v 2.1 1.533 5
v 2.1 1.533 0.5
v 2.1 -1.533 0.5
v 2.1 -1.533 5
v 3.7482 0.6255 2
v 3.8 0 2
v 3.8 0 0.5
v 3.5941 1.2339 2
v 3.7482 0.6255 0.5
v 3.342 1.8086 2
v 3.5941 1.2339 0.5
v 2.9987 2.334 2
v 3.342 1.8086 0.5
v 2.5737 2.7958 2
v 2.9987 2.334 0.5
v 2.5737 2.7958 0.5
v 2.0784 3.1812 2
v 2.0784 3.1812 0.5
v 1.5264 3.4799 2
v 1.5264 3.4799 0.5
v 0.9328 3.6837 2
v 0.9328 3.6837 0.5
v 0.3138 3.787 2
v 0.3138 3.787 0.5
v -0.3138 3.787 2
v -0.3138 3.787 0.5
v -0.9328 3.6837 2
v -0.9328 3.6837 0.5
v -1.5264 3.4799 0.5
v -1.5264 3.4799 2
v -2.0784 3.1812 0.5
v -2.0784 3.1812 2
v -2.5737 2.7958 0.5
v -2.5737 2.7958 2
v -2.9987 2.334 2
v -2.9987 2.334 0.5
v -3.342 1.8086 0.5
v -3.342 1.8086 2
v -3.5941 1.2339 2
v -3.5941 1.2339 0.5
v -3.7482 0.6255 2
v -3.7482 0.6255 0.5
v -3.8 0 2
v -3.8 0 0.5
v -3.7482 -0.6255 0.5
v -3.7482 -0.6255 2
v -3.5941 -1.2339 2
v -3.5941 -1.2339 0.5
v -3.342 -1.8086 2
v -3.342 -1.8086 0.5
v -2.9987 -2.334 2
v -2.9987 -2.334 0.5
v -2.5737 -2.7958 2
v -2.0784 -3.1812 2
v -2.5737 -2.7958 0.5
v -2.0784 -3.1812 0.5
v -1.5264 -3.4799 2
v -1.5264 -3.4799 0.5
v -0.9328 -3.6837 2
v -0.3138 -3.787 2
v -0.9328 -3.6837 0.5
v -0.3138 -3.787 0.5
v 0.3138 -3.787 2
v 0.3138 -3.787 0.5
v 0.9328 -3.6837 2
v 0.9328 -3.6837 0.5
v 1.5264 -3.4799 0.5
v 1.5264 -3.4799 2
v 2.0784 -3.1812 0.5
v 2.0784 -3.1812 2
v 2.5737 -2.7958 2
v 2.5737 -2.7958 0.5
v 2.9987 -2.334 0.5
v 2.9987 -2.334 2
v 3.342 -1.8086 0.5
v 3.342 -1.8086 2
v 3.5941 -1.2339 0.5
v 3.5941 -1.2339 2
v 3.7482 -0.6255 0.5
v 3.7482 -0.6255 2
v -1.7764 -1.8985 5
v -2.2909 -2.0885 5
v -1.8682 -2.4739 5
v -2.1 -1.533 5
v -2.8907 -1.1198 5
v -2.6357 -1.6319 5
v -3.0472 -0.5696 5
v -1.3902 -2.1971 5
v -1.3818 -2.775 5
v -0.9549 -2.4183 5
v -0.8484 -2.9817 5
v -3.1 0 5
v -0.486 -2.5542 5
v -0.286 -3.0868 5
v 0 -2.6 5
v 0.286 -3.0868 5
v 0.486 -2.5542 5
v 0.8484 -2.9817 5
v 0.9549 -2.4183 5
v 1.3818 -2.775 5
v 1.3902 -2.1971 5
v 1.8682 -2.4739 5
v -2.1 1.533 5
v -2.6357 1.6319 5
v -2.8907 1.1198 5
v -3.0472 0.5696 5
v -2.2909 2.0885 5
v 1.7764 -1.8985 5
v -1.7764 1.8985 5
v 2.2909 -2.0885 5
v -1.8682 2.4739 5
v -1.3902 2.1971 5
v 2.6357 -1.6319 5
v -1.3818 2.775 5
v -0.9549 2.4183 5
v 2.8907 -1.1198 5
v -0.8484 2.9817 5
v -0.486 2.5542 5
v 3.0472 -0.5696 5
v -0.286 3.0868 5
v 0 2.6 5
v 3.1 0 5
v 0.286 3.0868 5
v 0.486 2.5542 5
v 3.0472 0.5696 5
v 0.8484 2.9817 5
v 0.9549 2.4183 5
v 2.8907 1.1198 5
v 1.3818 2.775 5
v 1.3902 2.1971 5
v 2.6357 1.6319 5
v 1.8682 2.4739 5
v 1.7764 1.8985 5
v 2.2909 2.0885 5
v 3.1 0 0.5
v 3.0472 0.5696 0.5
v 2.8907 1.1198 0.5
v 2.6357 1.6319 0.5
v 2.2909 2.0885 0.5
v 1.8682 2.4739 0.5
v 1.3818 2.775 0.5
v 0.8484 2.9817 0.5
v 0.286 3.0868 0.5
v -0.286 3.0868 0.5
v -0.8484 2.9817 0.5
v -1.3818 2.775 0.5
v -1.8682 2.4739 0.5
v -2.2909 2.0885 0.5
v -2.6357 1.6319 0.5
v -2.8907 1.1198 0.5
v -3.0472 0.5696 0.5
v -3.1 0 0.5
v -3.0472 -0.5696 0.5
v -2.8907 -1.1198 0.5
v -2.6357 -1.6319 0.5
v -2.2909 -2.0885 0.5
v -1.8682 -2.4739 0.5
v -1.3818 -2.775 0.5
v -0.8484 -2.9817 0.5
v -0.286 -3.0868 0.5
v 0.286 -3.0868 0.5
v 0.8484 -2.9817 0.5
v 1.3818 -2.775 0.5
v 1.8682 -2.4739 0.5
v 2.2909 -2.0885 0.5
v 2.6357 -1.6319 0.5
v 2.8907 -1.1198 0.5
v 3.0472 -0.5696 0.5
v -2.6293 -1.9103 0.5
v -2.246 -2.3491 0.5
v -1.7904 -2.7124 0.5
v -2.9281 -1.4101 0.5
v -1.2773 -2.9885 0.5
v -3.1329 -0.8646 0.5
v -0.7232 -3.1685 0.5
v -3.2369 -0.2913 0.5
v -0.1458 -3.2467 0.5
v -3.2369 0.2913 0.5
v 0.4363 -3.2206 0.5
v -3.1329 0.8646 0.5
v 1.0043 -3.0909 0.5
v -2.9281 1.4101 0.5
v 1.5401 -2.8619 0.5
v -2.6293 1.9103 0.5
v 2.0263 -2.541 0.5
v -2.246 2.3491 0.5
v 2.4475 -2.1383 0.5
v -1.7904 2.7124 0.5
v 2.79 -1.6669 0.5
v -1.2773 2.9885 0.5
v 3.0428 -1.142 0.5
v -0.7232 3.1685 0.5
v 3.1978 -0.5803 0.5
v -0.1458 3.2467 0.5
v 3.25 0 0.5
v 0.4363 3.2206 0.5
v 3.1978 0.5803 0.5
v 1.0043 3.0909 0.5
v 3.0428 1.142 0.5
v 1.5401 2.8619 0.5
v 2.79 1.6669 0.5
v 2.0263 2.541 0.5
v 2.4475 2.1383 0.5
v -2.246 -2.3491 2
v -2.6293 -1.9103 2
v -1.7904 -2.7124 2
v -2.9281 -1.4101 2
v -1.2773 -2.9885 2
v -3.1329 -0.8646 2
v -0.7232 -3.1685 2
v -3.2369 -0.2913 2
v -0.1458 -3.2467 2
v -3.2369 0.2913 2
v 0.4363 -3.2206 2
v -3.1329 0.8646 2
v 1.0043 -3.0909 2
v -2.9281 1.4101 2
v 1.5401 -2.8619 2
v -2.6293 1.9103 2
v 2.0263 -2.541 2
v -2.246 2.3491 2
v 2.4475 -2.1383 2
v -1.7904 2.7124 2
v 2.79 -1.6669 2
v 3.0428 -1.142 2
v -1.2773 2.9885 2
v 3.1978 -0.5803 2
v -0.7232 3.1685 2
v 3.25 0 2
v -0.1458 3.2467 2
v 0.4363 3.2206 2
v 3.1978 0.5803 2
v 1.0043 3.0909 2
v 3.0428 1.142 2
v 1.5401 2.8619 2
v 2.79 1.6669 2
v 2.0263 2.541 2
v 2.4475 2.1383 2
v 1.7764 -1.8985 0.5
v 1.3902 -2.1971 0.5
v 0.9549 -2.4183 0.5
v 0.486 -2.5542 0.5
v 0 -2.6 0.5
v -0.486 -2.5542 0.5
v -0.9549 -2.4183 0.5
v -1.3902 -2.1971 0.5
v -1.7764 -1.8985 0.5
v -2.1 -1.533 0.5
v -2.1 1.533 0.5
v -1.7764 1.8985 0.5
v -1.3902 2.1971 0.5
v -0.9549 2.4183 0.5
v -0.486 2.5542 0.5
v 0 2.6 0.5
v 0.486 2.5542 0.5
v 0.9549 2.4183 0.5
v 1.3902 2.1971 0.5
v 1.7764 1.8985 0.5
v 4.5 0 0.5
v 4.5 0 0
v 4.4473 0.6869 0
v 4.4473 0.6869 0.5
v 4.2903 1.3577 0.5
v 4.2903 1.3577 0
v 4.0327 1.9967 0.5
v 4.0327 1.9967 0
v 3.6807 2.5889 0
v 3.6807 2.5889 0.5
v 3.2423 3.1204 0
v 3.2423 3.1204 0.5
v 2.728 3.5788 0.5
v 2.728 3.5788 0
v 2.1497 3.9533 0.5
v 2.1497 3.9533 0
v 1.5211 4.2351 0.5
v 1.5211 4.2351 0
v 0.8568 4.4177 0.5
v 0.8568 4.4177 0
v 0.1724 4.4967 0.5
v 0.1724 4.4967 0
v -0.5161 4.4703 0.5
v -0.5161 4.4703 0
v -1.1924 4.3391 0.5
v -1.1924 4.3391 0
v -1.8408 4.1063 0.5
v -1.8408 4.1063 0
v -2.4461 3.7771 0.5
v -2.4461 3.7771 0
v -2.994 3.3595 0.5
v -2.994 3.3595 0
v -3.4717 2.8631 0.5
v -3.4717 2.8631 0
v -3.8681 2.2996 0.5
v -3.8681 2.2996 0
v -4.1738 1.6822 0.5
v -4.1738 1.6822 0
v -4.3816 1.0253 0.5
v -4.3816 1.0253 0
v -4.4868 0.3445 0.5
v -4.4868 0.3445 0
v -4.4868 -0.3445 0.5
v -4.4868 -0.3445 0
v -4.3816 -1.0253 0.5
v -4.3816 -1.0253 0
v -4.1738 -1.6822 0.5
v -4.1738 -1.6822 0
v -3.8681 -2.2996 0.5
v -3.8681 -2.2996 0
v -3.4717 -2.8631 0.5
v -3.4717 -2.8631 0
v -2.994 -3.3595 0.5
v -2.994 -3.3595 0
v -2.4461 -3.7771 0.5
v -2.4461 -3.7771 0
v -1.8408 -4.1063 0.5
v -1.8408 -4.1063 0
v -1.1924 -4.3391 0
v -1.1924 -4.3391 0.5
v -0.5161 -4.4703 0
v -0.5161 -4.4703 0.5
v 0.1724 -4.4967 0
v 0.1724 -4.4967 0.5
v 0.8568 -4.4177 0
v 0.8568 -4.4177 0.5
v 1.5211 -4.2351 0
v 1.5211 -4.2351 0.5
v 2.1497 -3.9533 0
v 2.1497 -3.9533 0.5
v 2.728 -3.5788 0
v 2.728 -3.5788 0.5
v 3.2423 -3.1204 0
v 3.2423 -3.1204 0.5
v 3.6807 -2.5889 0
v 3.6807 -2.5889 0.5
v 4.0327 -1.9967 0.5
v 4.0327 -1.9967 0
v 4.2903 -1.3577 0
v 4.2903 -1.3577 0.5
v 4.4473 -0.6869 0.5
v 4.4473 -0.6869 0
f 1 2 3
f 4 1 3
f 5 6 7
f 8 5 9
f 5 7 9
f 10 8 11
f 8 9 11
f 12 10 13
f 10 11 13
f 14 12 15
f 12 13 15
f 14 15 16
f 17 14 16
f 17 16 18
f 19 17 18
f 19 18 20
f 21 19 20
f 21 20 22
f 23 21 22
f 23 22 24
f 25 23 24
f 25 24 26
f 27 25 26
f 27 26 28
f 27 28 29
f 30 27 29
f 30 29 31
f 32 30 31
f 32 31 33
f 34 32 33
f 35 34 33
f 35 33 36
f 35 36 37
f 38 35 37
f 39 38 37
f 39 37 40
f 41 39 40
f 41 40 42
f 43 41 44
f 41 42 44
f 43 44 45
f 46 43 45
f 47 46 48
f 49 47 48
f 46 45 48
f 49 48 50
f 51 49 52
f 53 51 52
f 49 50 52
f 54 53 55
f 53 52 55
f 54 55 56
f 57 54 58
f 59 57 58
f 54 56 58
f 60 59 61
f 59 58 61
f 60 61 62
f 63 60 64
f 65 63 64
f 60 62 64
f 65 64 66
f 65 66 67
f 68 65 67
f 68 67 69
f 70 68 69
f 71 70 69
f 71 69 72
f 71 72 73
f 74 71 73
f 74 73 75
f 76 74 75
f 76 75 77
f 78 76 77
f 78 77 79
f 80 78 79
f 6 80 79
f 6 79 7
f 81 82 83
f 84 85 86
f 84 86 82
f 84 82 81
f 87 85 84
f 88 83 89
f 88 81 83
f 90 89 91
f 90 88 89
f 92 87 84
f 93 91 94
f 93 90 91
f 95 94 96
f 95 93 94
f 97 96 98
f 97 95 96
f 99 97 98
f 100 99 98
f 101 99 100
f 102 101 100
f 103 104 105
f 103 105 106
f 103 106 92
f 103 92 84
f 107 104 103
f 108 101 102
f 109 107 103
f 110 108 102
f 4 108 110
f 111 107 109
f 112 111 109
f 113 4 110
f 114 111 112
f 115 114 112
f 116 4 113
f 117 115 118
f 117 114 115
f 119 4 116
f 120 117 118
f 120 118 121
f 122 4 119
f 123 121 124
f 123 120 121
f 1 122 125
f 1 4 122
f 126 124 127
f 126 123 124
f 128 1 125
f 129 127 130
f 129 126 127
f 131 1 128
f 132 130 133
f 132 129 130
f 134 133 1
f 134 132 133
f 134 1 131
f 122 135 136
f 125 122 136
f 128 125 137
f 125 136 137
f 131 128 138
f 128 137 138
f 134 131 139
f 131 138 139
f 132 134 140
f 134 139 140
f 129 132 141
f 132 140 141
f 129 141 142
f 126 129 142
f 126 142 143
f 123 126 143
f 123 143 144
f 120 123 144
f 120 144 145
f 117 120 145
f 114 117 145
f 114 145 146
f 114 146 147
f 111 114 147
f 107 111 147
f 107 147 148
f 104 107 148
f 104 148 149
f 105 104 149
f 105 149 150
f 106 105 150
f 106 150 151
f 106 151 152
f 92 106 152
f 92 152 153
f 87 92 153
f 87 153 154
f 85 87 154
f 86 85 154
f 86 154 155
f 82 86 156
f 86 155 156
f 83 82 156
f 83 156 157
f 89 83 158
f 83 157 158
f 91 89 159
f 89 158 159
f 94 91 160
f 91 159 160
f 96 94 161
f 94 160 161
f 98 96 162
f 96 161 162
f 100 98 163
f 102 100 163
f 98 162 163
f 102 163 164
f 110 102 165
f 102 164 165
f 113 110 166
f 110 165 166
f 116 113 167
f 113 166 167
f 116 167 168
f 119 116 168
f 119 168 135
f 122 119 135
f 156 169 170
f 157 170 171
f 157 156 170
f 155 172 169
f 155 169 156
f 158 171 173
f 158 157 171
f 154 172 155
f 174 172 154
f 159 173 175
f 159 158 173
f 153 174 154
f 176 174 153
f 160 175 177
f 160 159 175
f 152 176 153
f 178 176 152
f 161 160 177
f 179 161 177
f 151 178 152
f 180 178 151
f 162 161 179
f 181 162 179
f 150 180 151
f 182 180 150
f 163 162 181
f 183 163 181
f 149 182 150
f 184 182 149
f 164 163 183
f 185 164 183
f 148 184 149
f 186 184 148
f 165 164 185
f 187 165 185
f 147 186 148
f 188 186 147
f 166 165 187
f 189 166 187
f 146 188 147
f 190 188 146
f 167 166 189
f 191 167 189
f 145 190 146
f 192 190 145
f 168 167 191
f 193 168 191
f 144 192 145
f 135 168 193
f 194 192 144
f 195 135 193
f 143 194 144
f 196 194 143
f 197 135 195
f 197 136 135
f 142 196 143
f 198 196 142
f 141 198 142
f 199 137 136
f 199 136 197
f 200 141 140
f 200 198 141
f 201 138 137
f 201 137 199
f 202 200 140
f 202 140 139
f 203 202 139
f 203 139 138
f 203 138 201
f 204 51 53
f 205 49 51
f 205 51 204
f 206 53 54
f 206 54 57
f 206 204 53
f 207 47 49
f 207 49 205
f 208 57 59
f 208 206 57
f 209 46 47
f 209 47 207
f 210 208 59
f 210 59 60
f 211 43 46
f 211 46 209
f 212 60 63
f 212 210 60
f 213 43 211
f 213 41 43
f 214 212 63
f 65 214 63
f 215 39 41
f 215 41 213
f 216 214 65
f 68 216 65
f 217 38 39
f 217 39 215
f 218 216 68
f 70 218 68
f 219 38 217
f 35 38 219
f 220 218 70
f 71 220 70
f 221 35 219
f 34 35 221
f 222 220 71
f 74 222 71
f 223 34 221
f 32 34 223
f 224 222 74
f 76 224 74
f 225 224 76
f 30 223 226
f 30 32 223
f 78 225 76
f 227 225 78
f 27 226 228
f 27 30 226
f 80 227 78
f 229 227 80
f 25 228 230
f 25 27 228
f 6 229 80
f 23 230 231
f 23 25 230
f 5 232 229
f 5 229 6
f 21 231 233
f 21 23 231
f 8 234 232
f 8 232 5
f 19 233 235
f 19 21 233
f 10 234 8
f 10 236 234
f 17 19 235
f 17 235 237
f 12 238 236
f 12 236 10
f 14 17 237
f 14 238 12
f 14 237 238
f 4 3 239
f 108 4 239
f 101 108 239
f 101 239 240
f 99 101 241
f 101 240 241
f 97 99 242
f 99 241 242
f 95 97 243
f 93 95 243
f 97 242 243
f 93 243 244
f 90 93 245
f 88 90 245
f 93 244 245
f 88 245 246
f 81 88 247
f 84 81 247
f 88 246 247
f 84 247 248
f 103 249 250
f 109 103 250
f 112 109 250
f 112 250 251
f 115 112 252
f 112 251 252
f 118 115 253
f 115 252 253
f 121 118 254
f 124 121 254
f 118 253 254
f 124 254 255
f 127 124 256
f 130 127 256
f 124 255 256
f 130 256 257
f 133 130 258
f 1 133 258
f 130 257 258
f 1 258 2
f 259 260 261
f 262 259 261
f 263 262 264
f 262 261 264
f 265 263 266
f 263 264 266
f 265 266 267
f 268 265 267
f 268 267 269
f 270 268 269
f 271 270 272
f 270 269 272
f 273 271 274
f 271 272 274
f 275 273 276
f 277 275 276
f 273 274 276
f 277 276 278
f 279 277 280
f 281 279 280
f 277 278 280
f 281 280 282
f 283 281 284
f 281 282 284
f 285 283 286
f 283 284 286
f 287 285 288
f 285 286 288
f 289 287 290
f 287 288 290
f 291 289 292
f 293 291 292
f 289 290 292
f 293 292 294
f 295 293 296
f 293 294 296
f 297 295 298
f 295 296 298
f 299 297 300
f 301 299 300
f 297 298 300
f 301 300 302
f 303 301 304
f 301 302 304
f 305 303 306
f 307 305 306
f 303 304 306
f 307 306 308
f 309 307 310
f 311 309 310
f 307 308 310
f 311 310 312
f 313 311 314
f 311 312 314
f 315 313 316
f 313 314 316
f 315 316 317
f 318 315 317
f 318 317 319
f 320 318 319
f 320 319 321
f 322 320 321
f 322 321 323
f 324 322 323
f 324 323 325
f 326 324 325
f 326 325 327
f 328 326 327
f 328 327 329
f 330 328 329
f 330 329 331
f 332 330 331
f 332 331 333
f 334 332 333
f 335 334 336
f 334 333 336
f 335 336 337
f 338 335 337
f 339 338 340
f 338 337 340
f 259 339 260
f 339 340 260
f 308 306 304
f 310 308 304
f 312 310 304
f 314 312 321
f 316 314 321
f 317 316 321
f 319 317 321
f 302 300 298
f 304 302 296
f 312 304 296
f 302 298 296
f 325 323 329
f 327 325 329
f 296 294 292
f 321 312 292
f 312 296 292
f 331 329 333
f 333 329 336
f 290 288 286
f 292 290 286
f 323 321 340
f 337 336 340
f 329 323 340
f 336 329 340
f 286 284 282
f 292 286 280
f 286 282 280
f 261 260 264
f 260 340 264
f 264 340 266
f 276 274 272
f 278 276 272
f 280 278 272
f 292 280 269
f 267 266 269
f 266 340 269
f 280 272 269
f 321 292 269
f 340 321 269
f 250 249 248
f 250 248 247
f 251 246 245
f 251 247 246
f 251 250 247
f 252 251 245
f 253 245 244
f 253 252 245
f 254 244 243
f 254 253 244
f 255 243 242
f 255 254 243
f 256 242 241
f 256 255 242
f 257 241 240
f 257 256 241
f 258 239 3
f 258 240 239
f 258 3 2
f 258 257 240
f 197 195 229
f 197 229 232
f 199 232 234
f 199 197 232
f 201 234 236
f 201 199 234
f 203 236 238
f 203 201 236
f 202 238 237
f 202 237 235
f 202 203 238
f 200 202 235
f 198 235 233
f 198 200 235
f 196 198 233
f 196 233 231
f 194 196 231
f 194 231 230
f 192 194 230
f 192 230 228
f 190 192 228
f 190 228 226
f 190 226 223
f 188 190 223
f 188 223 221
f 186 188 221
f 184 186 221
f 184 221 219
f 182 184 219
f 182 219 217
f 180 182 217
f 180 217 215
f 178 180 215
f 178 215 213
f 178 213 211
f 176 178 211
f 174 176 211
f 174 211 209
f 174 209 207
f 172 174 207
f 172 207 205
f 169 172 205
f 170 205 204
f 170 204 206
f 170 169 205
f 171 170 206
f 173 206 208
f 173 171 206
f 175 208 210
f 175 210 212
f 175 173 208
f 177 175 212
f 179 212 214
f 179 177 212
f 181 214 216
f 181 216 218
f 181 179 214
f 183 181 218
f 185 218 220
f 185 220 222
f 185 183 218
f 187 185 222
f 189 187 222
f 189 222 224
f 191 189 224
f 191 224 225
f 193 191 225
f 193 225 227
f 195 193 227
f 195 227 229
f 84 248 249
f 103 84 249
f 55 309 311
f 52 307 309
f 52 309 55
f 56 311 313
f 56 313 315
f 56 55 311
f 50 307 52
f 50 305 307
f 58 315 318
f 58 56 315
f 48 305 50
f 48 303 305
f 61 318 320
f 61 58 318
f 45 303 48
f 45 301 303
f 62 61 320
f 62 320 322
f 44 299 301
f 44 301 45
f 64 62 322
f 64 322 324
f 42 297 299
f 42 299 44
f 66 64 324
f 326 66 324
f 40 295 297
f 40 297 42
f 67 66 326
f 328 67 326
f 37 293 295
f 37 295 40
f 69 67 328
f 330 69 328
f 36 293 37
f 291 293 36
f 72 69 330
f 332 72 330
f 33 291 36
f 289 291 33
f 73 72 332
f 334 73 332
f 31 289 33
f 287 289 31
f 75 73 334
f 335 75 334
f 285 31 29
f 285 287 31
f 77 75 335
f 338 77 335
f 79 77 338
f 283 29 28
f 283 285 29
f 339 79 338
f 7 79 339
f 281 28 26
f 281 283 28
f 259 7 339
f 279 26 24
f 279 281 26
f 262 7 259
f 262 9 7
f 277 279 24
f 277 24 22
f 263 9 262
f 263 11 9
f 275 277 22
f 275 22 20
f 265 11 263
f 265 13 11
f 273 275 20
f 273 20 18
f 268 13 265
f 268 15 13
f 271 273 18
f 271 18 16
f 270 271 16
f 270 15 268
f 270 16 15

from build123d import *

# Parameters (mm, degrees)
F0_R     = 4.5
F0_R_2   = 3.8
F0_R_3   = 3.25
F1_DEPTH = 0.5
F2_DEPTH = 2
F3_R     = 3.1
F4_DEPTH = 5
F5_DEPTH = 0.5


with BuildPart() as f1:
    # F0 (on Top) → F1 (new body)
    with BuildSketch(Plane.XY):
        Circle(F0_R)
        Circle(F0_R_2, mode=Mode.SUBTRACT)
        Circle(F0_R_2)
        Circle(F0_R_3, mode=Mode.SUBTRACT)
    extrude(amount=F1_DEPTH)

    # F0 (on Top) → F2 (join)
    with BuildSketch(Plane.XY):
        Circle(F0_R_2)
        Circle(F0_R_3, mode=Mode.SUBTRACT)
    extrude(amount=F2_DEPTH)



with BuildPart() as f4:
    # F3 (on face) → F4 (new body)
    with BuildSketch(Plane.XY):
        Circle(F3_R)
        with BuildLine():
            ThreePointArc((2.1, 1.5329709717), (2.4718414189, 0.8062257748), (2.6, 0))
            ThreePointArc((2.6, 0), (2.4718414189, -0.8062257748), (2.1, -1.5329709717))
            ThreePointArc((2.1, -1.5329709717), (0, -2.6), (-2.1, -1.5329709717))
            ThreePointArc((-2.1, -1.5329709717), (-2.6, 0), (-2.1, 1.5329709717))
            ThreePointArc((-2.1, 1.5329709717), (0, 2.6), (2.1, 1.5329709717))
        make_face(mode=Mode.SUBTRACT)
        with BuildLine():
            ThreePointArc((2.1, -1.5329709717), (2.4718414189, -0.8062257748), (2.6, 0))
            ThreePointArc((2.6, 0), (2.4718414189, 0.8062257748), (2.1, 1.5329709717))
            Line((2.1, 1.5329709717), (2.1, -1.5329709717))
        make_face()
        with BuildLine():
            Line((-2.1, -1.5329709717), (-2.1, 1.5329709717))
            ThreePointArc((-2.1, 1.5329709717), (-2.6, 0), (-2.1, -1.5329709717))
        make_face()
    extrude(amount=F4_DEPTH)


with BuildPart() as f1_1:
    add(f1.part)

    add(f4.part)  # F5 merges F4
    # F0 (on Top) → F5 (join)
    with BuildSketch(Plane.XY):
        Circle(F0_R_3)
    extrude(amount=F5_DEPTH)


solid = f1_1.part
